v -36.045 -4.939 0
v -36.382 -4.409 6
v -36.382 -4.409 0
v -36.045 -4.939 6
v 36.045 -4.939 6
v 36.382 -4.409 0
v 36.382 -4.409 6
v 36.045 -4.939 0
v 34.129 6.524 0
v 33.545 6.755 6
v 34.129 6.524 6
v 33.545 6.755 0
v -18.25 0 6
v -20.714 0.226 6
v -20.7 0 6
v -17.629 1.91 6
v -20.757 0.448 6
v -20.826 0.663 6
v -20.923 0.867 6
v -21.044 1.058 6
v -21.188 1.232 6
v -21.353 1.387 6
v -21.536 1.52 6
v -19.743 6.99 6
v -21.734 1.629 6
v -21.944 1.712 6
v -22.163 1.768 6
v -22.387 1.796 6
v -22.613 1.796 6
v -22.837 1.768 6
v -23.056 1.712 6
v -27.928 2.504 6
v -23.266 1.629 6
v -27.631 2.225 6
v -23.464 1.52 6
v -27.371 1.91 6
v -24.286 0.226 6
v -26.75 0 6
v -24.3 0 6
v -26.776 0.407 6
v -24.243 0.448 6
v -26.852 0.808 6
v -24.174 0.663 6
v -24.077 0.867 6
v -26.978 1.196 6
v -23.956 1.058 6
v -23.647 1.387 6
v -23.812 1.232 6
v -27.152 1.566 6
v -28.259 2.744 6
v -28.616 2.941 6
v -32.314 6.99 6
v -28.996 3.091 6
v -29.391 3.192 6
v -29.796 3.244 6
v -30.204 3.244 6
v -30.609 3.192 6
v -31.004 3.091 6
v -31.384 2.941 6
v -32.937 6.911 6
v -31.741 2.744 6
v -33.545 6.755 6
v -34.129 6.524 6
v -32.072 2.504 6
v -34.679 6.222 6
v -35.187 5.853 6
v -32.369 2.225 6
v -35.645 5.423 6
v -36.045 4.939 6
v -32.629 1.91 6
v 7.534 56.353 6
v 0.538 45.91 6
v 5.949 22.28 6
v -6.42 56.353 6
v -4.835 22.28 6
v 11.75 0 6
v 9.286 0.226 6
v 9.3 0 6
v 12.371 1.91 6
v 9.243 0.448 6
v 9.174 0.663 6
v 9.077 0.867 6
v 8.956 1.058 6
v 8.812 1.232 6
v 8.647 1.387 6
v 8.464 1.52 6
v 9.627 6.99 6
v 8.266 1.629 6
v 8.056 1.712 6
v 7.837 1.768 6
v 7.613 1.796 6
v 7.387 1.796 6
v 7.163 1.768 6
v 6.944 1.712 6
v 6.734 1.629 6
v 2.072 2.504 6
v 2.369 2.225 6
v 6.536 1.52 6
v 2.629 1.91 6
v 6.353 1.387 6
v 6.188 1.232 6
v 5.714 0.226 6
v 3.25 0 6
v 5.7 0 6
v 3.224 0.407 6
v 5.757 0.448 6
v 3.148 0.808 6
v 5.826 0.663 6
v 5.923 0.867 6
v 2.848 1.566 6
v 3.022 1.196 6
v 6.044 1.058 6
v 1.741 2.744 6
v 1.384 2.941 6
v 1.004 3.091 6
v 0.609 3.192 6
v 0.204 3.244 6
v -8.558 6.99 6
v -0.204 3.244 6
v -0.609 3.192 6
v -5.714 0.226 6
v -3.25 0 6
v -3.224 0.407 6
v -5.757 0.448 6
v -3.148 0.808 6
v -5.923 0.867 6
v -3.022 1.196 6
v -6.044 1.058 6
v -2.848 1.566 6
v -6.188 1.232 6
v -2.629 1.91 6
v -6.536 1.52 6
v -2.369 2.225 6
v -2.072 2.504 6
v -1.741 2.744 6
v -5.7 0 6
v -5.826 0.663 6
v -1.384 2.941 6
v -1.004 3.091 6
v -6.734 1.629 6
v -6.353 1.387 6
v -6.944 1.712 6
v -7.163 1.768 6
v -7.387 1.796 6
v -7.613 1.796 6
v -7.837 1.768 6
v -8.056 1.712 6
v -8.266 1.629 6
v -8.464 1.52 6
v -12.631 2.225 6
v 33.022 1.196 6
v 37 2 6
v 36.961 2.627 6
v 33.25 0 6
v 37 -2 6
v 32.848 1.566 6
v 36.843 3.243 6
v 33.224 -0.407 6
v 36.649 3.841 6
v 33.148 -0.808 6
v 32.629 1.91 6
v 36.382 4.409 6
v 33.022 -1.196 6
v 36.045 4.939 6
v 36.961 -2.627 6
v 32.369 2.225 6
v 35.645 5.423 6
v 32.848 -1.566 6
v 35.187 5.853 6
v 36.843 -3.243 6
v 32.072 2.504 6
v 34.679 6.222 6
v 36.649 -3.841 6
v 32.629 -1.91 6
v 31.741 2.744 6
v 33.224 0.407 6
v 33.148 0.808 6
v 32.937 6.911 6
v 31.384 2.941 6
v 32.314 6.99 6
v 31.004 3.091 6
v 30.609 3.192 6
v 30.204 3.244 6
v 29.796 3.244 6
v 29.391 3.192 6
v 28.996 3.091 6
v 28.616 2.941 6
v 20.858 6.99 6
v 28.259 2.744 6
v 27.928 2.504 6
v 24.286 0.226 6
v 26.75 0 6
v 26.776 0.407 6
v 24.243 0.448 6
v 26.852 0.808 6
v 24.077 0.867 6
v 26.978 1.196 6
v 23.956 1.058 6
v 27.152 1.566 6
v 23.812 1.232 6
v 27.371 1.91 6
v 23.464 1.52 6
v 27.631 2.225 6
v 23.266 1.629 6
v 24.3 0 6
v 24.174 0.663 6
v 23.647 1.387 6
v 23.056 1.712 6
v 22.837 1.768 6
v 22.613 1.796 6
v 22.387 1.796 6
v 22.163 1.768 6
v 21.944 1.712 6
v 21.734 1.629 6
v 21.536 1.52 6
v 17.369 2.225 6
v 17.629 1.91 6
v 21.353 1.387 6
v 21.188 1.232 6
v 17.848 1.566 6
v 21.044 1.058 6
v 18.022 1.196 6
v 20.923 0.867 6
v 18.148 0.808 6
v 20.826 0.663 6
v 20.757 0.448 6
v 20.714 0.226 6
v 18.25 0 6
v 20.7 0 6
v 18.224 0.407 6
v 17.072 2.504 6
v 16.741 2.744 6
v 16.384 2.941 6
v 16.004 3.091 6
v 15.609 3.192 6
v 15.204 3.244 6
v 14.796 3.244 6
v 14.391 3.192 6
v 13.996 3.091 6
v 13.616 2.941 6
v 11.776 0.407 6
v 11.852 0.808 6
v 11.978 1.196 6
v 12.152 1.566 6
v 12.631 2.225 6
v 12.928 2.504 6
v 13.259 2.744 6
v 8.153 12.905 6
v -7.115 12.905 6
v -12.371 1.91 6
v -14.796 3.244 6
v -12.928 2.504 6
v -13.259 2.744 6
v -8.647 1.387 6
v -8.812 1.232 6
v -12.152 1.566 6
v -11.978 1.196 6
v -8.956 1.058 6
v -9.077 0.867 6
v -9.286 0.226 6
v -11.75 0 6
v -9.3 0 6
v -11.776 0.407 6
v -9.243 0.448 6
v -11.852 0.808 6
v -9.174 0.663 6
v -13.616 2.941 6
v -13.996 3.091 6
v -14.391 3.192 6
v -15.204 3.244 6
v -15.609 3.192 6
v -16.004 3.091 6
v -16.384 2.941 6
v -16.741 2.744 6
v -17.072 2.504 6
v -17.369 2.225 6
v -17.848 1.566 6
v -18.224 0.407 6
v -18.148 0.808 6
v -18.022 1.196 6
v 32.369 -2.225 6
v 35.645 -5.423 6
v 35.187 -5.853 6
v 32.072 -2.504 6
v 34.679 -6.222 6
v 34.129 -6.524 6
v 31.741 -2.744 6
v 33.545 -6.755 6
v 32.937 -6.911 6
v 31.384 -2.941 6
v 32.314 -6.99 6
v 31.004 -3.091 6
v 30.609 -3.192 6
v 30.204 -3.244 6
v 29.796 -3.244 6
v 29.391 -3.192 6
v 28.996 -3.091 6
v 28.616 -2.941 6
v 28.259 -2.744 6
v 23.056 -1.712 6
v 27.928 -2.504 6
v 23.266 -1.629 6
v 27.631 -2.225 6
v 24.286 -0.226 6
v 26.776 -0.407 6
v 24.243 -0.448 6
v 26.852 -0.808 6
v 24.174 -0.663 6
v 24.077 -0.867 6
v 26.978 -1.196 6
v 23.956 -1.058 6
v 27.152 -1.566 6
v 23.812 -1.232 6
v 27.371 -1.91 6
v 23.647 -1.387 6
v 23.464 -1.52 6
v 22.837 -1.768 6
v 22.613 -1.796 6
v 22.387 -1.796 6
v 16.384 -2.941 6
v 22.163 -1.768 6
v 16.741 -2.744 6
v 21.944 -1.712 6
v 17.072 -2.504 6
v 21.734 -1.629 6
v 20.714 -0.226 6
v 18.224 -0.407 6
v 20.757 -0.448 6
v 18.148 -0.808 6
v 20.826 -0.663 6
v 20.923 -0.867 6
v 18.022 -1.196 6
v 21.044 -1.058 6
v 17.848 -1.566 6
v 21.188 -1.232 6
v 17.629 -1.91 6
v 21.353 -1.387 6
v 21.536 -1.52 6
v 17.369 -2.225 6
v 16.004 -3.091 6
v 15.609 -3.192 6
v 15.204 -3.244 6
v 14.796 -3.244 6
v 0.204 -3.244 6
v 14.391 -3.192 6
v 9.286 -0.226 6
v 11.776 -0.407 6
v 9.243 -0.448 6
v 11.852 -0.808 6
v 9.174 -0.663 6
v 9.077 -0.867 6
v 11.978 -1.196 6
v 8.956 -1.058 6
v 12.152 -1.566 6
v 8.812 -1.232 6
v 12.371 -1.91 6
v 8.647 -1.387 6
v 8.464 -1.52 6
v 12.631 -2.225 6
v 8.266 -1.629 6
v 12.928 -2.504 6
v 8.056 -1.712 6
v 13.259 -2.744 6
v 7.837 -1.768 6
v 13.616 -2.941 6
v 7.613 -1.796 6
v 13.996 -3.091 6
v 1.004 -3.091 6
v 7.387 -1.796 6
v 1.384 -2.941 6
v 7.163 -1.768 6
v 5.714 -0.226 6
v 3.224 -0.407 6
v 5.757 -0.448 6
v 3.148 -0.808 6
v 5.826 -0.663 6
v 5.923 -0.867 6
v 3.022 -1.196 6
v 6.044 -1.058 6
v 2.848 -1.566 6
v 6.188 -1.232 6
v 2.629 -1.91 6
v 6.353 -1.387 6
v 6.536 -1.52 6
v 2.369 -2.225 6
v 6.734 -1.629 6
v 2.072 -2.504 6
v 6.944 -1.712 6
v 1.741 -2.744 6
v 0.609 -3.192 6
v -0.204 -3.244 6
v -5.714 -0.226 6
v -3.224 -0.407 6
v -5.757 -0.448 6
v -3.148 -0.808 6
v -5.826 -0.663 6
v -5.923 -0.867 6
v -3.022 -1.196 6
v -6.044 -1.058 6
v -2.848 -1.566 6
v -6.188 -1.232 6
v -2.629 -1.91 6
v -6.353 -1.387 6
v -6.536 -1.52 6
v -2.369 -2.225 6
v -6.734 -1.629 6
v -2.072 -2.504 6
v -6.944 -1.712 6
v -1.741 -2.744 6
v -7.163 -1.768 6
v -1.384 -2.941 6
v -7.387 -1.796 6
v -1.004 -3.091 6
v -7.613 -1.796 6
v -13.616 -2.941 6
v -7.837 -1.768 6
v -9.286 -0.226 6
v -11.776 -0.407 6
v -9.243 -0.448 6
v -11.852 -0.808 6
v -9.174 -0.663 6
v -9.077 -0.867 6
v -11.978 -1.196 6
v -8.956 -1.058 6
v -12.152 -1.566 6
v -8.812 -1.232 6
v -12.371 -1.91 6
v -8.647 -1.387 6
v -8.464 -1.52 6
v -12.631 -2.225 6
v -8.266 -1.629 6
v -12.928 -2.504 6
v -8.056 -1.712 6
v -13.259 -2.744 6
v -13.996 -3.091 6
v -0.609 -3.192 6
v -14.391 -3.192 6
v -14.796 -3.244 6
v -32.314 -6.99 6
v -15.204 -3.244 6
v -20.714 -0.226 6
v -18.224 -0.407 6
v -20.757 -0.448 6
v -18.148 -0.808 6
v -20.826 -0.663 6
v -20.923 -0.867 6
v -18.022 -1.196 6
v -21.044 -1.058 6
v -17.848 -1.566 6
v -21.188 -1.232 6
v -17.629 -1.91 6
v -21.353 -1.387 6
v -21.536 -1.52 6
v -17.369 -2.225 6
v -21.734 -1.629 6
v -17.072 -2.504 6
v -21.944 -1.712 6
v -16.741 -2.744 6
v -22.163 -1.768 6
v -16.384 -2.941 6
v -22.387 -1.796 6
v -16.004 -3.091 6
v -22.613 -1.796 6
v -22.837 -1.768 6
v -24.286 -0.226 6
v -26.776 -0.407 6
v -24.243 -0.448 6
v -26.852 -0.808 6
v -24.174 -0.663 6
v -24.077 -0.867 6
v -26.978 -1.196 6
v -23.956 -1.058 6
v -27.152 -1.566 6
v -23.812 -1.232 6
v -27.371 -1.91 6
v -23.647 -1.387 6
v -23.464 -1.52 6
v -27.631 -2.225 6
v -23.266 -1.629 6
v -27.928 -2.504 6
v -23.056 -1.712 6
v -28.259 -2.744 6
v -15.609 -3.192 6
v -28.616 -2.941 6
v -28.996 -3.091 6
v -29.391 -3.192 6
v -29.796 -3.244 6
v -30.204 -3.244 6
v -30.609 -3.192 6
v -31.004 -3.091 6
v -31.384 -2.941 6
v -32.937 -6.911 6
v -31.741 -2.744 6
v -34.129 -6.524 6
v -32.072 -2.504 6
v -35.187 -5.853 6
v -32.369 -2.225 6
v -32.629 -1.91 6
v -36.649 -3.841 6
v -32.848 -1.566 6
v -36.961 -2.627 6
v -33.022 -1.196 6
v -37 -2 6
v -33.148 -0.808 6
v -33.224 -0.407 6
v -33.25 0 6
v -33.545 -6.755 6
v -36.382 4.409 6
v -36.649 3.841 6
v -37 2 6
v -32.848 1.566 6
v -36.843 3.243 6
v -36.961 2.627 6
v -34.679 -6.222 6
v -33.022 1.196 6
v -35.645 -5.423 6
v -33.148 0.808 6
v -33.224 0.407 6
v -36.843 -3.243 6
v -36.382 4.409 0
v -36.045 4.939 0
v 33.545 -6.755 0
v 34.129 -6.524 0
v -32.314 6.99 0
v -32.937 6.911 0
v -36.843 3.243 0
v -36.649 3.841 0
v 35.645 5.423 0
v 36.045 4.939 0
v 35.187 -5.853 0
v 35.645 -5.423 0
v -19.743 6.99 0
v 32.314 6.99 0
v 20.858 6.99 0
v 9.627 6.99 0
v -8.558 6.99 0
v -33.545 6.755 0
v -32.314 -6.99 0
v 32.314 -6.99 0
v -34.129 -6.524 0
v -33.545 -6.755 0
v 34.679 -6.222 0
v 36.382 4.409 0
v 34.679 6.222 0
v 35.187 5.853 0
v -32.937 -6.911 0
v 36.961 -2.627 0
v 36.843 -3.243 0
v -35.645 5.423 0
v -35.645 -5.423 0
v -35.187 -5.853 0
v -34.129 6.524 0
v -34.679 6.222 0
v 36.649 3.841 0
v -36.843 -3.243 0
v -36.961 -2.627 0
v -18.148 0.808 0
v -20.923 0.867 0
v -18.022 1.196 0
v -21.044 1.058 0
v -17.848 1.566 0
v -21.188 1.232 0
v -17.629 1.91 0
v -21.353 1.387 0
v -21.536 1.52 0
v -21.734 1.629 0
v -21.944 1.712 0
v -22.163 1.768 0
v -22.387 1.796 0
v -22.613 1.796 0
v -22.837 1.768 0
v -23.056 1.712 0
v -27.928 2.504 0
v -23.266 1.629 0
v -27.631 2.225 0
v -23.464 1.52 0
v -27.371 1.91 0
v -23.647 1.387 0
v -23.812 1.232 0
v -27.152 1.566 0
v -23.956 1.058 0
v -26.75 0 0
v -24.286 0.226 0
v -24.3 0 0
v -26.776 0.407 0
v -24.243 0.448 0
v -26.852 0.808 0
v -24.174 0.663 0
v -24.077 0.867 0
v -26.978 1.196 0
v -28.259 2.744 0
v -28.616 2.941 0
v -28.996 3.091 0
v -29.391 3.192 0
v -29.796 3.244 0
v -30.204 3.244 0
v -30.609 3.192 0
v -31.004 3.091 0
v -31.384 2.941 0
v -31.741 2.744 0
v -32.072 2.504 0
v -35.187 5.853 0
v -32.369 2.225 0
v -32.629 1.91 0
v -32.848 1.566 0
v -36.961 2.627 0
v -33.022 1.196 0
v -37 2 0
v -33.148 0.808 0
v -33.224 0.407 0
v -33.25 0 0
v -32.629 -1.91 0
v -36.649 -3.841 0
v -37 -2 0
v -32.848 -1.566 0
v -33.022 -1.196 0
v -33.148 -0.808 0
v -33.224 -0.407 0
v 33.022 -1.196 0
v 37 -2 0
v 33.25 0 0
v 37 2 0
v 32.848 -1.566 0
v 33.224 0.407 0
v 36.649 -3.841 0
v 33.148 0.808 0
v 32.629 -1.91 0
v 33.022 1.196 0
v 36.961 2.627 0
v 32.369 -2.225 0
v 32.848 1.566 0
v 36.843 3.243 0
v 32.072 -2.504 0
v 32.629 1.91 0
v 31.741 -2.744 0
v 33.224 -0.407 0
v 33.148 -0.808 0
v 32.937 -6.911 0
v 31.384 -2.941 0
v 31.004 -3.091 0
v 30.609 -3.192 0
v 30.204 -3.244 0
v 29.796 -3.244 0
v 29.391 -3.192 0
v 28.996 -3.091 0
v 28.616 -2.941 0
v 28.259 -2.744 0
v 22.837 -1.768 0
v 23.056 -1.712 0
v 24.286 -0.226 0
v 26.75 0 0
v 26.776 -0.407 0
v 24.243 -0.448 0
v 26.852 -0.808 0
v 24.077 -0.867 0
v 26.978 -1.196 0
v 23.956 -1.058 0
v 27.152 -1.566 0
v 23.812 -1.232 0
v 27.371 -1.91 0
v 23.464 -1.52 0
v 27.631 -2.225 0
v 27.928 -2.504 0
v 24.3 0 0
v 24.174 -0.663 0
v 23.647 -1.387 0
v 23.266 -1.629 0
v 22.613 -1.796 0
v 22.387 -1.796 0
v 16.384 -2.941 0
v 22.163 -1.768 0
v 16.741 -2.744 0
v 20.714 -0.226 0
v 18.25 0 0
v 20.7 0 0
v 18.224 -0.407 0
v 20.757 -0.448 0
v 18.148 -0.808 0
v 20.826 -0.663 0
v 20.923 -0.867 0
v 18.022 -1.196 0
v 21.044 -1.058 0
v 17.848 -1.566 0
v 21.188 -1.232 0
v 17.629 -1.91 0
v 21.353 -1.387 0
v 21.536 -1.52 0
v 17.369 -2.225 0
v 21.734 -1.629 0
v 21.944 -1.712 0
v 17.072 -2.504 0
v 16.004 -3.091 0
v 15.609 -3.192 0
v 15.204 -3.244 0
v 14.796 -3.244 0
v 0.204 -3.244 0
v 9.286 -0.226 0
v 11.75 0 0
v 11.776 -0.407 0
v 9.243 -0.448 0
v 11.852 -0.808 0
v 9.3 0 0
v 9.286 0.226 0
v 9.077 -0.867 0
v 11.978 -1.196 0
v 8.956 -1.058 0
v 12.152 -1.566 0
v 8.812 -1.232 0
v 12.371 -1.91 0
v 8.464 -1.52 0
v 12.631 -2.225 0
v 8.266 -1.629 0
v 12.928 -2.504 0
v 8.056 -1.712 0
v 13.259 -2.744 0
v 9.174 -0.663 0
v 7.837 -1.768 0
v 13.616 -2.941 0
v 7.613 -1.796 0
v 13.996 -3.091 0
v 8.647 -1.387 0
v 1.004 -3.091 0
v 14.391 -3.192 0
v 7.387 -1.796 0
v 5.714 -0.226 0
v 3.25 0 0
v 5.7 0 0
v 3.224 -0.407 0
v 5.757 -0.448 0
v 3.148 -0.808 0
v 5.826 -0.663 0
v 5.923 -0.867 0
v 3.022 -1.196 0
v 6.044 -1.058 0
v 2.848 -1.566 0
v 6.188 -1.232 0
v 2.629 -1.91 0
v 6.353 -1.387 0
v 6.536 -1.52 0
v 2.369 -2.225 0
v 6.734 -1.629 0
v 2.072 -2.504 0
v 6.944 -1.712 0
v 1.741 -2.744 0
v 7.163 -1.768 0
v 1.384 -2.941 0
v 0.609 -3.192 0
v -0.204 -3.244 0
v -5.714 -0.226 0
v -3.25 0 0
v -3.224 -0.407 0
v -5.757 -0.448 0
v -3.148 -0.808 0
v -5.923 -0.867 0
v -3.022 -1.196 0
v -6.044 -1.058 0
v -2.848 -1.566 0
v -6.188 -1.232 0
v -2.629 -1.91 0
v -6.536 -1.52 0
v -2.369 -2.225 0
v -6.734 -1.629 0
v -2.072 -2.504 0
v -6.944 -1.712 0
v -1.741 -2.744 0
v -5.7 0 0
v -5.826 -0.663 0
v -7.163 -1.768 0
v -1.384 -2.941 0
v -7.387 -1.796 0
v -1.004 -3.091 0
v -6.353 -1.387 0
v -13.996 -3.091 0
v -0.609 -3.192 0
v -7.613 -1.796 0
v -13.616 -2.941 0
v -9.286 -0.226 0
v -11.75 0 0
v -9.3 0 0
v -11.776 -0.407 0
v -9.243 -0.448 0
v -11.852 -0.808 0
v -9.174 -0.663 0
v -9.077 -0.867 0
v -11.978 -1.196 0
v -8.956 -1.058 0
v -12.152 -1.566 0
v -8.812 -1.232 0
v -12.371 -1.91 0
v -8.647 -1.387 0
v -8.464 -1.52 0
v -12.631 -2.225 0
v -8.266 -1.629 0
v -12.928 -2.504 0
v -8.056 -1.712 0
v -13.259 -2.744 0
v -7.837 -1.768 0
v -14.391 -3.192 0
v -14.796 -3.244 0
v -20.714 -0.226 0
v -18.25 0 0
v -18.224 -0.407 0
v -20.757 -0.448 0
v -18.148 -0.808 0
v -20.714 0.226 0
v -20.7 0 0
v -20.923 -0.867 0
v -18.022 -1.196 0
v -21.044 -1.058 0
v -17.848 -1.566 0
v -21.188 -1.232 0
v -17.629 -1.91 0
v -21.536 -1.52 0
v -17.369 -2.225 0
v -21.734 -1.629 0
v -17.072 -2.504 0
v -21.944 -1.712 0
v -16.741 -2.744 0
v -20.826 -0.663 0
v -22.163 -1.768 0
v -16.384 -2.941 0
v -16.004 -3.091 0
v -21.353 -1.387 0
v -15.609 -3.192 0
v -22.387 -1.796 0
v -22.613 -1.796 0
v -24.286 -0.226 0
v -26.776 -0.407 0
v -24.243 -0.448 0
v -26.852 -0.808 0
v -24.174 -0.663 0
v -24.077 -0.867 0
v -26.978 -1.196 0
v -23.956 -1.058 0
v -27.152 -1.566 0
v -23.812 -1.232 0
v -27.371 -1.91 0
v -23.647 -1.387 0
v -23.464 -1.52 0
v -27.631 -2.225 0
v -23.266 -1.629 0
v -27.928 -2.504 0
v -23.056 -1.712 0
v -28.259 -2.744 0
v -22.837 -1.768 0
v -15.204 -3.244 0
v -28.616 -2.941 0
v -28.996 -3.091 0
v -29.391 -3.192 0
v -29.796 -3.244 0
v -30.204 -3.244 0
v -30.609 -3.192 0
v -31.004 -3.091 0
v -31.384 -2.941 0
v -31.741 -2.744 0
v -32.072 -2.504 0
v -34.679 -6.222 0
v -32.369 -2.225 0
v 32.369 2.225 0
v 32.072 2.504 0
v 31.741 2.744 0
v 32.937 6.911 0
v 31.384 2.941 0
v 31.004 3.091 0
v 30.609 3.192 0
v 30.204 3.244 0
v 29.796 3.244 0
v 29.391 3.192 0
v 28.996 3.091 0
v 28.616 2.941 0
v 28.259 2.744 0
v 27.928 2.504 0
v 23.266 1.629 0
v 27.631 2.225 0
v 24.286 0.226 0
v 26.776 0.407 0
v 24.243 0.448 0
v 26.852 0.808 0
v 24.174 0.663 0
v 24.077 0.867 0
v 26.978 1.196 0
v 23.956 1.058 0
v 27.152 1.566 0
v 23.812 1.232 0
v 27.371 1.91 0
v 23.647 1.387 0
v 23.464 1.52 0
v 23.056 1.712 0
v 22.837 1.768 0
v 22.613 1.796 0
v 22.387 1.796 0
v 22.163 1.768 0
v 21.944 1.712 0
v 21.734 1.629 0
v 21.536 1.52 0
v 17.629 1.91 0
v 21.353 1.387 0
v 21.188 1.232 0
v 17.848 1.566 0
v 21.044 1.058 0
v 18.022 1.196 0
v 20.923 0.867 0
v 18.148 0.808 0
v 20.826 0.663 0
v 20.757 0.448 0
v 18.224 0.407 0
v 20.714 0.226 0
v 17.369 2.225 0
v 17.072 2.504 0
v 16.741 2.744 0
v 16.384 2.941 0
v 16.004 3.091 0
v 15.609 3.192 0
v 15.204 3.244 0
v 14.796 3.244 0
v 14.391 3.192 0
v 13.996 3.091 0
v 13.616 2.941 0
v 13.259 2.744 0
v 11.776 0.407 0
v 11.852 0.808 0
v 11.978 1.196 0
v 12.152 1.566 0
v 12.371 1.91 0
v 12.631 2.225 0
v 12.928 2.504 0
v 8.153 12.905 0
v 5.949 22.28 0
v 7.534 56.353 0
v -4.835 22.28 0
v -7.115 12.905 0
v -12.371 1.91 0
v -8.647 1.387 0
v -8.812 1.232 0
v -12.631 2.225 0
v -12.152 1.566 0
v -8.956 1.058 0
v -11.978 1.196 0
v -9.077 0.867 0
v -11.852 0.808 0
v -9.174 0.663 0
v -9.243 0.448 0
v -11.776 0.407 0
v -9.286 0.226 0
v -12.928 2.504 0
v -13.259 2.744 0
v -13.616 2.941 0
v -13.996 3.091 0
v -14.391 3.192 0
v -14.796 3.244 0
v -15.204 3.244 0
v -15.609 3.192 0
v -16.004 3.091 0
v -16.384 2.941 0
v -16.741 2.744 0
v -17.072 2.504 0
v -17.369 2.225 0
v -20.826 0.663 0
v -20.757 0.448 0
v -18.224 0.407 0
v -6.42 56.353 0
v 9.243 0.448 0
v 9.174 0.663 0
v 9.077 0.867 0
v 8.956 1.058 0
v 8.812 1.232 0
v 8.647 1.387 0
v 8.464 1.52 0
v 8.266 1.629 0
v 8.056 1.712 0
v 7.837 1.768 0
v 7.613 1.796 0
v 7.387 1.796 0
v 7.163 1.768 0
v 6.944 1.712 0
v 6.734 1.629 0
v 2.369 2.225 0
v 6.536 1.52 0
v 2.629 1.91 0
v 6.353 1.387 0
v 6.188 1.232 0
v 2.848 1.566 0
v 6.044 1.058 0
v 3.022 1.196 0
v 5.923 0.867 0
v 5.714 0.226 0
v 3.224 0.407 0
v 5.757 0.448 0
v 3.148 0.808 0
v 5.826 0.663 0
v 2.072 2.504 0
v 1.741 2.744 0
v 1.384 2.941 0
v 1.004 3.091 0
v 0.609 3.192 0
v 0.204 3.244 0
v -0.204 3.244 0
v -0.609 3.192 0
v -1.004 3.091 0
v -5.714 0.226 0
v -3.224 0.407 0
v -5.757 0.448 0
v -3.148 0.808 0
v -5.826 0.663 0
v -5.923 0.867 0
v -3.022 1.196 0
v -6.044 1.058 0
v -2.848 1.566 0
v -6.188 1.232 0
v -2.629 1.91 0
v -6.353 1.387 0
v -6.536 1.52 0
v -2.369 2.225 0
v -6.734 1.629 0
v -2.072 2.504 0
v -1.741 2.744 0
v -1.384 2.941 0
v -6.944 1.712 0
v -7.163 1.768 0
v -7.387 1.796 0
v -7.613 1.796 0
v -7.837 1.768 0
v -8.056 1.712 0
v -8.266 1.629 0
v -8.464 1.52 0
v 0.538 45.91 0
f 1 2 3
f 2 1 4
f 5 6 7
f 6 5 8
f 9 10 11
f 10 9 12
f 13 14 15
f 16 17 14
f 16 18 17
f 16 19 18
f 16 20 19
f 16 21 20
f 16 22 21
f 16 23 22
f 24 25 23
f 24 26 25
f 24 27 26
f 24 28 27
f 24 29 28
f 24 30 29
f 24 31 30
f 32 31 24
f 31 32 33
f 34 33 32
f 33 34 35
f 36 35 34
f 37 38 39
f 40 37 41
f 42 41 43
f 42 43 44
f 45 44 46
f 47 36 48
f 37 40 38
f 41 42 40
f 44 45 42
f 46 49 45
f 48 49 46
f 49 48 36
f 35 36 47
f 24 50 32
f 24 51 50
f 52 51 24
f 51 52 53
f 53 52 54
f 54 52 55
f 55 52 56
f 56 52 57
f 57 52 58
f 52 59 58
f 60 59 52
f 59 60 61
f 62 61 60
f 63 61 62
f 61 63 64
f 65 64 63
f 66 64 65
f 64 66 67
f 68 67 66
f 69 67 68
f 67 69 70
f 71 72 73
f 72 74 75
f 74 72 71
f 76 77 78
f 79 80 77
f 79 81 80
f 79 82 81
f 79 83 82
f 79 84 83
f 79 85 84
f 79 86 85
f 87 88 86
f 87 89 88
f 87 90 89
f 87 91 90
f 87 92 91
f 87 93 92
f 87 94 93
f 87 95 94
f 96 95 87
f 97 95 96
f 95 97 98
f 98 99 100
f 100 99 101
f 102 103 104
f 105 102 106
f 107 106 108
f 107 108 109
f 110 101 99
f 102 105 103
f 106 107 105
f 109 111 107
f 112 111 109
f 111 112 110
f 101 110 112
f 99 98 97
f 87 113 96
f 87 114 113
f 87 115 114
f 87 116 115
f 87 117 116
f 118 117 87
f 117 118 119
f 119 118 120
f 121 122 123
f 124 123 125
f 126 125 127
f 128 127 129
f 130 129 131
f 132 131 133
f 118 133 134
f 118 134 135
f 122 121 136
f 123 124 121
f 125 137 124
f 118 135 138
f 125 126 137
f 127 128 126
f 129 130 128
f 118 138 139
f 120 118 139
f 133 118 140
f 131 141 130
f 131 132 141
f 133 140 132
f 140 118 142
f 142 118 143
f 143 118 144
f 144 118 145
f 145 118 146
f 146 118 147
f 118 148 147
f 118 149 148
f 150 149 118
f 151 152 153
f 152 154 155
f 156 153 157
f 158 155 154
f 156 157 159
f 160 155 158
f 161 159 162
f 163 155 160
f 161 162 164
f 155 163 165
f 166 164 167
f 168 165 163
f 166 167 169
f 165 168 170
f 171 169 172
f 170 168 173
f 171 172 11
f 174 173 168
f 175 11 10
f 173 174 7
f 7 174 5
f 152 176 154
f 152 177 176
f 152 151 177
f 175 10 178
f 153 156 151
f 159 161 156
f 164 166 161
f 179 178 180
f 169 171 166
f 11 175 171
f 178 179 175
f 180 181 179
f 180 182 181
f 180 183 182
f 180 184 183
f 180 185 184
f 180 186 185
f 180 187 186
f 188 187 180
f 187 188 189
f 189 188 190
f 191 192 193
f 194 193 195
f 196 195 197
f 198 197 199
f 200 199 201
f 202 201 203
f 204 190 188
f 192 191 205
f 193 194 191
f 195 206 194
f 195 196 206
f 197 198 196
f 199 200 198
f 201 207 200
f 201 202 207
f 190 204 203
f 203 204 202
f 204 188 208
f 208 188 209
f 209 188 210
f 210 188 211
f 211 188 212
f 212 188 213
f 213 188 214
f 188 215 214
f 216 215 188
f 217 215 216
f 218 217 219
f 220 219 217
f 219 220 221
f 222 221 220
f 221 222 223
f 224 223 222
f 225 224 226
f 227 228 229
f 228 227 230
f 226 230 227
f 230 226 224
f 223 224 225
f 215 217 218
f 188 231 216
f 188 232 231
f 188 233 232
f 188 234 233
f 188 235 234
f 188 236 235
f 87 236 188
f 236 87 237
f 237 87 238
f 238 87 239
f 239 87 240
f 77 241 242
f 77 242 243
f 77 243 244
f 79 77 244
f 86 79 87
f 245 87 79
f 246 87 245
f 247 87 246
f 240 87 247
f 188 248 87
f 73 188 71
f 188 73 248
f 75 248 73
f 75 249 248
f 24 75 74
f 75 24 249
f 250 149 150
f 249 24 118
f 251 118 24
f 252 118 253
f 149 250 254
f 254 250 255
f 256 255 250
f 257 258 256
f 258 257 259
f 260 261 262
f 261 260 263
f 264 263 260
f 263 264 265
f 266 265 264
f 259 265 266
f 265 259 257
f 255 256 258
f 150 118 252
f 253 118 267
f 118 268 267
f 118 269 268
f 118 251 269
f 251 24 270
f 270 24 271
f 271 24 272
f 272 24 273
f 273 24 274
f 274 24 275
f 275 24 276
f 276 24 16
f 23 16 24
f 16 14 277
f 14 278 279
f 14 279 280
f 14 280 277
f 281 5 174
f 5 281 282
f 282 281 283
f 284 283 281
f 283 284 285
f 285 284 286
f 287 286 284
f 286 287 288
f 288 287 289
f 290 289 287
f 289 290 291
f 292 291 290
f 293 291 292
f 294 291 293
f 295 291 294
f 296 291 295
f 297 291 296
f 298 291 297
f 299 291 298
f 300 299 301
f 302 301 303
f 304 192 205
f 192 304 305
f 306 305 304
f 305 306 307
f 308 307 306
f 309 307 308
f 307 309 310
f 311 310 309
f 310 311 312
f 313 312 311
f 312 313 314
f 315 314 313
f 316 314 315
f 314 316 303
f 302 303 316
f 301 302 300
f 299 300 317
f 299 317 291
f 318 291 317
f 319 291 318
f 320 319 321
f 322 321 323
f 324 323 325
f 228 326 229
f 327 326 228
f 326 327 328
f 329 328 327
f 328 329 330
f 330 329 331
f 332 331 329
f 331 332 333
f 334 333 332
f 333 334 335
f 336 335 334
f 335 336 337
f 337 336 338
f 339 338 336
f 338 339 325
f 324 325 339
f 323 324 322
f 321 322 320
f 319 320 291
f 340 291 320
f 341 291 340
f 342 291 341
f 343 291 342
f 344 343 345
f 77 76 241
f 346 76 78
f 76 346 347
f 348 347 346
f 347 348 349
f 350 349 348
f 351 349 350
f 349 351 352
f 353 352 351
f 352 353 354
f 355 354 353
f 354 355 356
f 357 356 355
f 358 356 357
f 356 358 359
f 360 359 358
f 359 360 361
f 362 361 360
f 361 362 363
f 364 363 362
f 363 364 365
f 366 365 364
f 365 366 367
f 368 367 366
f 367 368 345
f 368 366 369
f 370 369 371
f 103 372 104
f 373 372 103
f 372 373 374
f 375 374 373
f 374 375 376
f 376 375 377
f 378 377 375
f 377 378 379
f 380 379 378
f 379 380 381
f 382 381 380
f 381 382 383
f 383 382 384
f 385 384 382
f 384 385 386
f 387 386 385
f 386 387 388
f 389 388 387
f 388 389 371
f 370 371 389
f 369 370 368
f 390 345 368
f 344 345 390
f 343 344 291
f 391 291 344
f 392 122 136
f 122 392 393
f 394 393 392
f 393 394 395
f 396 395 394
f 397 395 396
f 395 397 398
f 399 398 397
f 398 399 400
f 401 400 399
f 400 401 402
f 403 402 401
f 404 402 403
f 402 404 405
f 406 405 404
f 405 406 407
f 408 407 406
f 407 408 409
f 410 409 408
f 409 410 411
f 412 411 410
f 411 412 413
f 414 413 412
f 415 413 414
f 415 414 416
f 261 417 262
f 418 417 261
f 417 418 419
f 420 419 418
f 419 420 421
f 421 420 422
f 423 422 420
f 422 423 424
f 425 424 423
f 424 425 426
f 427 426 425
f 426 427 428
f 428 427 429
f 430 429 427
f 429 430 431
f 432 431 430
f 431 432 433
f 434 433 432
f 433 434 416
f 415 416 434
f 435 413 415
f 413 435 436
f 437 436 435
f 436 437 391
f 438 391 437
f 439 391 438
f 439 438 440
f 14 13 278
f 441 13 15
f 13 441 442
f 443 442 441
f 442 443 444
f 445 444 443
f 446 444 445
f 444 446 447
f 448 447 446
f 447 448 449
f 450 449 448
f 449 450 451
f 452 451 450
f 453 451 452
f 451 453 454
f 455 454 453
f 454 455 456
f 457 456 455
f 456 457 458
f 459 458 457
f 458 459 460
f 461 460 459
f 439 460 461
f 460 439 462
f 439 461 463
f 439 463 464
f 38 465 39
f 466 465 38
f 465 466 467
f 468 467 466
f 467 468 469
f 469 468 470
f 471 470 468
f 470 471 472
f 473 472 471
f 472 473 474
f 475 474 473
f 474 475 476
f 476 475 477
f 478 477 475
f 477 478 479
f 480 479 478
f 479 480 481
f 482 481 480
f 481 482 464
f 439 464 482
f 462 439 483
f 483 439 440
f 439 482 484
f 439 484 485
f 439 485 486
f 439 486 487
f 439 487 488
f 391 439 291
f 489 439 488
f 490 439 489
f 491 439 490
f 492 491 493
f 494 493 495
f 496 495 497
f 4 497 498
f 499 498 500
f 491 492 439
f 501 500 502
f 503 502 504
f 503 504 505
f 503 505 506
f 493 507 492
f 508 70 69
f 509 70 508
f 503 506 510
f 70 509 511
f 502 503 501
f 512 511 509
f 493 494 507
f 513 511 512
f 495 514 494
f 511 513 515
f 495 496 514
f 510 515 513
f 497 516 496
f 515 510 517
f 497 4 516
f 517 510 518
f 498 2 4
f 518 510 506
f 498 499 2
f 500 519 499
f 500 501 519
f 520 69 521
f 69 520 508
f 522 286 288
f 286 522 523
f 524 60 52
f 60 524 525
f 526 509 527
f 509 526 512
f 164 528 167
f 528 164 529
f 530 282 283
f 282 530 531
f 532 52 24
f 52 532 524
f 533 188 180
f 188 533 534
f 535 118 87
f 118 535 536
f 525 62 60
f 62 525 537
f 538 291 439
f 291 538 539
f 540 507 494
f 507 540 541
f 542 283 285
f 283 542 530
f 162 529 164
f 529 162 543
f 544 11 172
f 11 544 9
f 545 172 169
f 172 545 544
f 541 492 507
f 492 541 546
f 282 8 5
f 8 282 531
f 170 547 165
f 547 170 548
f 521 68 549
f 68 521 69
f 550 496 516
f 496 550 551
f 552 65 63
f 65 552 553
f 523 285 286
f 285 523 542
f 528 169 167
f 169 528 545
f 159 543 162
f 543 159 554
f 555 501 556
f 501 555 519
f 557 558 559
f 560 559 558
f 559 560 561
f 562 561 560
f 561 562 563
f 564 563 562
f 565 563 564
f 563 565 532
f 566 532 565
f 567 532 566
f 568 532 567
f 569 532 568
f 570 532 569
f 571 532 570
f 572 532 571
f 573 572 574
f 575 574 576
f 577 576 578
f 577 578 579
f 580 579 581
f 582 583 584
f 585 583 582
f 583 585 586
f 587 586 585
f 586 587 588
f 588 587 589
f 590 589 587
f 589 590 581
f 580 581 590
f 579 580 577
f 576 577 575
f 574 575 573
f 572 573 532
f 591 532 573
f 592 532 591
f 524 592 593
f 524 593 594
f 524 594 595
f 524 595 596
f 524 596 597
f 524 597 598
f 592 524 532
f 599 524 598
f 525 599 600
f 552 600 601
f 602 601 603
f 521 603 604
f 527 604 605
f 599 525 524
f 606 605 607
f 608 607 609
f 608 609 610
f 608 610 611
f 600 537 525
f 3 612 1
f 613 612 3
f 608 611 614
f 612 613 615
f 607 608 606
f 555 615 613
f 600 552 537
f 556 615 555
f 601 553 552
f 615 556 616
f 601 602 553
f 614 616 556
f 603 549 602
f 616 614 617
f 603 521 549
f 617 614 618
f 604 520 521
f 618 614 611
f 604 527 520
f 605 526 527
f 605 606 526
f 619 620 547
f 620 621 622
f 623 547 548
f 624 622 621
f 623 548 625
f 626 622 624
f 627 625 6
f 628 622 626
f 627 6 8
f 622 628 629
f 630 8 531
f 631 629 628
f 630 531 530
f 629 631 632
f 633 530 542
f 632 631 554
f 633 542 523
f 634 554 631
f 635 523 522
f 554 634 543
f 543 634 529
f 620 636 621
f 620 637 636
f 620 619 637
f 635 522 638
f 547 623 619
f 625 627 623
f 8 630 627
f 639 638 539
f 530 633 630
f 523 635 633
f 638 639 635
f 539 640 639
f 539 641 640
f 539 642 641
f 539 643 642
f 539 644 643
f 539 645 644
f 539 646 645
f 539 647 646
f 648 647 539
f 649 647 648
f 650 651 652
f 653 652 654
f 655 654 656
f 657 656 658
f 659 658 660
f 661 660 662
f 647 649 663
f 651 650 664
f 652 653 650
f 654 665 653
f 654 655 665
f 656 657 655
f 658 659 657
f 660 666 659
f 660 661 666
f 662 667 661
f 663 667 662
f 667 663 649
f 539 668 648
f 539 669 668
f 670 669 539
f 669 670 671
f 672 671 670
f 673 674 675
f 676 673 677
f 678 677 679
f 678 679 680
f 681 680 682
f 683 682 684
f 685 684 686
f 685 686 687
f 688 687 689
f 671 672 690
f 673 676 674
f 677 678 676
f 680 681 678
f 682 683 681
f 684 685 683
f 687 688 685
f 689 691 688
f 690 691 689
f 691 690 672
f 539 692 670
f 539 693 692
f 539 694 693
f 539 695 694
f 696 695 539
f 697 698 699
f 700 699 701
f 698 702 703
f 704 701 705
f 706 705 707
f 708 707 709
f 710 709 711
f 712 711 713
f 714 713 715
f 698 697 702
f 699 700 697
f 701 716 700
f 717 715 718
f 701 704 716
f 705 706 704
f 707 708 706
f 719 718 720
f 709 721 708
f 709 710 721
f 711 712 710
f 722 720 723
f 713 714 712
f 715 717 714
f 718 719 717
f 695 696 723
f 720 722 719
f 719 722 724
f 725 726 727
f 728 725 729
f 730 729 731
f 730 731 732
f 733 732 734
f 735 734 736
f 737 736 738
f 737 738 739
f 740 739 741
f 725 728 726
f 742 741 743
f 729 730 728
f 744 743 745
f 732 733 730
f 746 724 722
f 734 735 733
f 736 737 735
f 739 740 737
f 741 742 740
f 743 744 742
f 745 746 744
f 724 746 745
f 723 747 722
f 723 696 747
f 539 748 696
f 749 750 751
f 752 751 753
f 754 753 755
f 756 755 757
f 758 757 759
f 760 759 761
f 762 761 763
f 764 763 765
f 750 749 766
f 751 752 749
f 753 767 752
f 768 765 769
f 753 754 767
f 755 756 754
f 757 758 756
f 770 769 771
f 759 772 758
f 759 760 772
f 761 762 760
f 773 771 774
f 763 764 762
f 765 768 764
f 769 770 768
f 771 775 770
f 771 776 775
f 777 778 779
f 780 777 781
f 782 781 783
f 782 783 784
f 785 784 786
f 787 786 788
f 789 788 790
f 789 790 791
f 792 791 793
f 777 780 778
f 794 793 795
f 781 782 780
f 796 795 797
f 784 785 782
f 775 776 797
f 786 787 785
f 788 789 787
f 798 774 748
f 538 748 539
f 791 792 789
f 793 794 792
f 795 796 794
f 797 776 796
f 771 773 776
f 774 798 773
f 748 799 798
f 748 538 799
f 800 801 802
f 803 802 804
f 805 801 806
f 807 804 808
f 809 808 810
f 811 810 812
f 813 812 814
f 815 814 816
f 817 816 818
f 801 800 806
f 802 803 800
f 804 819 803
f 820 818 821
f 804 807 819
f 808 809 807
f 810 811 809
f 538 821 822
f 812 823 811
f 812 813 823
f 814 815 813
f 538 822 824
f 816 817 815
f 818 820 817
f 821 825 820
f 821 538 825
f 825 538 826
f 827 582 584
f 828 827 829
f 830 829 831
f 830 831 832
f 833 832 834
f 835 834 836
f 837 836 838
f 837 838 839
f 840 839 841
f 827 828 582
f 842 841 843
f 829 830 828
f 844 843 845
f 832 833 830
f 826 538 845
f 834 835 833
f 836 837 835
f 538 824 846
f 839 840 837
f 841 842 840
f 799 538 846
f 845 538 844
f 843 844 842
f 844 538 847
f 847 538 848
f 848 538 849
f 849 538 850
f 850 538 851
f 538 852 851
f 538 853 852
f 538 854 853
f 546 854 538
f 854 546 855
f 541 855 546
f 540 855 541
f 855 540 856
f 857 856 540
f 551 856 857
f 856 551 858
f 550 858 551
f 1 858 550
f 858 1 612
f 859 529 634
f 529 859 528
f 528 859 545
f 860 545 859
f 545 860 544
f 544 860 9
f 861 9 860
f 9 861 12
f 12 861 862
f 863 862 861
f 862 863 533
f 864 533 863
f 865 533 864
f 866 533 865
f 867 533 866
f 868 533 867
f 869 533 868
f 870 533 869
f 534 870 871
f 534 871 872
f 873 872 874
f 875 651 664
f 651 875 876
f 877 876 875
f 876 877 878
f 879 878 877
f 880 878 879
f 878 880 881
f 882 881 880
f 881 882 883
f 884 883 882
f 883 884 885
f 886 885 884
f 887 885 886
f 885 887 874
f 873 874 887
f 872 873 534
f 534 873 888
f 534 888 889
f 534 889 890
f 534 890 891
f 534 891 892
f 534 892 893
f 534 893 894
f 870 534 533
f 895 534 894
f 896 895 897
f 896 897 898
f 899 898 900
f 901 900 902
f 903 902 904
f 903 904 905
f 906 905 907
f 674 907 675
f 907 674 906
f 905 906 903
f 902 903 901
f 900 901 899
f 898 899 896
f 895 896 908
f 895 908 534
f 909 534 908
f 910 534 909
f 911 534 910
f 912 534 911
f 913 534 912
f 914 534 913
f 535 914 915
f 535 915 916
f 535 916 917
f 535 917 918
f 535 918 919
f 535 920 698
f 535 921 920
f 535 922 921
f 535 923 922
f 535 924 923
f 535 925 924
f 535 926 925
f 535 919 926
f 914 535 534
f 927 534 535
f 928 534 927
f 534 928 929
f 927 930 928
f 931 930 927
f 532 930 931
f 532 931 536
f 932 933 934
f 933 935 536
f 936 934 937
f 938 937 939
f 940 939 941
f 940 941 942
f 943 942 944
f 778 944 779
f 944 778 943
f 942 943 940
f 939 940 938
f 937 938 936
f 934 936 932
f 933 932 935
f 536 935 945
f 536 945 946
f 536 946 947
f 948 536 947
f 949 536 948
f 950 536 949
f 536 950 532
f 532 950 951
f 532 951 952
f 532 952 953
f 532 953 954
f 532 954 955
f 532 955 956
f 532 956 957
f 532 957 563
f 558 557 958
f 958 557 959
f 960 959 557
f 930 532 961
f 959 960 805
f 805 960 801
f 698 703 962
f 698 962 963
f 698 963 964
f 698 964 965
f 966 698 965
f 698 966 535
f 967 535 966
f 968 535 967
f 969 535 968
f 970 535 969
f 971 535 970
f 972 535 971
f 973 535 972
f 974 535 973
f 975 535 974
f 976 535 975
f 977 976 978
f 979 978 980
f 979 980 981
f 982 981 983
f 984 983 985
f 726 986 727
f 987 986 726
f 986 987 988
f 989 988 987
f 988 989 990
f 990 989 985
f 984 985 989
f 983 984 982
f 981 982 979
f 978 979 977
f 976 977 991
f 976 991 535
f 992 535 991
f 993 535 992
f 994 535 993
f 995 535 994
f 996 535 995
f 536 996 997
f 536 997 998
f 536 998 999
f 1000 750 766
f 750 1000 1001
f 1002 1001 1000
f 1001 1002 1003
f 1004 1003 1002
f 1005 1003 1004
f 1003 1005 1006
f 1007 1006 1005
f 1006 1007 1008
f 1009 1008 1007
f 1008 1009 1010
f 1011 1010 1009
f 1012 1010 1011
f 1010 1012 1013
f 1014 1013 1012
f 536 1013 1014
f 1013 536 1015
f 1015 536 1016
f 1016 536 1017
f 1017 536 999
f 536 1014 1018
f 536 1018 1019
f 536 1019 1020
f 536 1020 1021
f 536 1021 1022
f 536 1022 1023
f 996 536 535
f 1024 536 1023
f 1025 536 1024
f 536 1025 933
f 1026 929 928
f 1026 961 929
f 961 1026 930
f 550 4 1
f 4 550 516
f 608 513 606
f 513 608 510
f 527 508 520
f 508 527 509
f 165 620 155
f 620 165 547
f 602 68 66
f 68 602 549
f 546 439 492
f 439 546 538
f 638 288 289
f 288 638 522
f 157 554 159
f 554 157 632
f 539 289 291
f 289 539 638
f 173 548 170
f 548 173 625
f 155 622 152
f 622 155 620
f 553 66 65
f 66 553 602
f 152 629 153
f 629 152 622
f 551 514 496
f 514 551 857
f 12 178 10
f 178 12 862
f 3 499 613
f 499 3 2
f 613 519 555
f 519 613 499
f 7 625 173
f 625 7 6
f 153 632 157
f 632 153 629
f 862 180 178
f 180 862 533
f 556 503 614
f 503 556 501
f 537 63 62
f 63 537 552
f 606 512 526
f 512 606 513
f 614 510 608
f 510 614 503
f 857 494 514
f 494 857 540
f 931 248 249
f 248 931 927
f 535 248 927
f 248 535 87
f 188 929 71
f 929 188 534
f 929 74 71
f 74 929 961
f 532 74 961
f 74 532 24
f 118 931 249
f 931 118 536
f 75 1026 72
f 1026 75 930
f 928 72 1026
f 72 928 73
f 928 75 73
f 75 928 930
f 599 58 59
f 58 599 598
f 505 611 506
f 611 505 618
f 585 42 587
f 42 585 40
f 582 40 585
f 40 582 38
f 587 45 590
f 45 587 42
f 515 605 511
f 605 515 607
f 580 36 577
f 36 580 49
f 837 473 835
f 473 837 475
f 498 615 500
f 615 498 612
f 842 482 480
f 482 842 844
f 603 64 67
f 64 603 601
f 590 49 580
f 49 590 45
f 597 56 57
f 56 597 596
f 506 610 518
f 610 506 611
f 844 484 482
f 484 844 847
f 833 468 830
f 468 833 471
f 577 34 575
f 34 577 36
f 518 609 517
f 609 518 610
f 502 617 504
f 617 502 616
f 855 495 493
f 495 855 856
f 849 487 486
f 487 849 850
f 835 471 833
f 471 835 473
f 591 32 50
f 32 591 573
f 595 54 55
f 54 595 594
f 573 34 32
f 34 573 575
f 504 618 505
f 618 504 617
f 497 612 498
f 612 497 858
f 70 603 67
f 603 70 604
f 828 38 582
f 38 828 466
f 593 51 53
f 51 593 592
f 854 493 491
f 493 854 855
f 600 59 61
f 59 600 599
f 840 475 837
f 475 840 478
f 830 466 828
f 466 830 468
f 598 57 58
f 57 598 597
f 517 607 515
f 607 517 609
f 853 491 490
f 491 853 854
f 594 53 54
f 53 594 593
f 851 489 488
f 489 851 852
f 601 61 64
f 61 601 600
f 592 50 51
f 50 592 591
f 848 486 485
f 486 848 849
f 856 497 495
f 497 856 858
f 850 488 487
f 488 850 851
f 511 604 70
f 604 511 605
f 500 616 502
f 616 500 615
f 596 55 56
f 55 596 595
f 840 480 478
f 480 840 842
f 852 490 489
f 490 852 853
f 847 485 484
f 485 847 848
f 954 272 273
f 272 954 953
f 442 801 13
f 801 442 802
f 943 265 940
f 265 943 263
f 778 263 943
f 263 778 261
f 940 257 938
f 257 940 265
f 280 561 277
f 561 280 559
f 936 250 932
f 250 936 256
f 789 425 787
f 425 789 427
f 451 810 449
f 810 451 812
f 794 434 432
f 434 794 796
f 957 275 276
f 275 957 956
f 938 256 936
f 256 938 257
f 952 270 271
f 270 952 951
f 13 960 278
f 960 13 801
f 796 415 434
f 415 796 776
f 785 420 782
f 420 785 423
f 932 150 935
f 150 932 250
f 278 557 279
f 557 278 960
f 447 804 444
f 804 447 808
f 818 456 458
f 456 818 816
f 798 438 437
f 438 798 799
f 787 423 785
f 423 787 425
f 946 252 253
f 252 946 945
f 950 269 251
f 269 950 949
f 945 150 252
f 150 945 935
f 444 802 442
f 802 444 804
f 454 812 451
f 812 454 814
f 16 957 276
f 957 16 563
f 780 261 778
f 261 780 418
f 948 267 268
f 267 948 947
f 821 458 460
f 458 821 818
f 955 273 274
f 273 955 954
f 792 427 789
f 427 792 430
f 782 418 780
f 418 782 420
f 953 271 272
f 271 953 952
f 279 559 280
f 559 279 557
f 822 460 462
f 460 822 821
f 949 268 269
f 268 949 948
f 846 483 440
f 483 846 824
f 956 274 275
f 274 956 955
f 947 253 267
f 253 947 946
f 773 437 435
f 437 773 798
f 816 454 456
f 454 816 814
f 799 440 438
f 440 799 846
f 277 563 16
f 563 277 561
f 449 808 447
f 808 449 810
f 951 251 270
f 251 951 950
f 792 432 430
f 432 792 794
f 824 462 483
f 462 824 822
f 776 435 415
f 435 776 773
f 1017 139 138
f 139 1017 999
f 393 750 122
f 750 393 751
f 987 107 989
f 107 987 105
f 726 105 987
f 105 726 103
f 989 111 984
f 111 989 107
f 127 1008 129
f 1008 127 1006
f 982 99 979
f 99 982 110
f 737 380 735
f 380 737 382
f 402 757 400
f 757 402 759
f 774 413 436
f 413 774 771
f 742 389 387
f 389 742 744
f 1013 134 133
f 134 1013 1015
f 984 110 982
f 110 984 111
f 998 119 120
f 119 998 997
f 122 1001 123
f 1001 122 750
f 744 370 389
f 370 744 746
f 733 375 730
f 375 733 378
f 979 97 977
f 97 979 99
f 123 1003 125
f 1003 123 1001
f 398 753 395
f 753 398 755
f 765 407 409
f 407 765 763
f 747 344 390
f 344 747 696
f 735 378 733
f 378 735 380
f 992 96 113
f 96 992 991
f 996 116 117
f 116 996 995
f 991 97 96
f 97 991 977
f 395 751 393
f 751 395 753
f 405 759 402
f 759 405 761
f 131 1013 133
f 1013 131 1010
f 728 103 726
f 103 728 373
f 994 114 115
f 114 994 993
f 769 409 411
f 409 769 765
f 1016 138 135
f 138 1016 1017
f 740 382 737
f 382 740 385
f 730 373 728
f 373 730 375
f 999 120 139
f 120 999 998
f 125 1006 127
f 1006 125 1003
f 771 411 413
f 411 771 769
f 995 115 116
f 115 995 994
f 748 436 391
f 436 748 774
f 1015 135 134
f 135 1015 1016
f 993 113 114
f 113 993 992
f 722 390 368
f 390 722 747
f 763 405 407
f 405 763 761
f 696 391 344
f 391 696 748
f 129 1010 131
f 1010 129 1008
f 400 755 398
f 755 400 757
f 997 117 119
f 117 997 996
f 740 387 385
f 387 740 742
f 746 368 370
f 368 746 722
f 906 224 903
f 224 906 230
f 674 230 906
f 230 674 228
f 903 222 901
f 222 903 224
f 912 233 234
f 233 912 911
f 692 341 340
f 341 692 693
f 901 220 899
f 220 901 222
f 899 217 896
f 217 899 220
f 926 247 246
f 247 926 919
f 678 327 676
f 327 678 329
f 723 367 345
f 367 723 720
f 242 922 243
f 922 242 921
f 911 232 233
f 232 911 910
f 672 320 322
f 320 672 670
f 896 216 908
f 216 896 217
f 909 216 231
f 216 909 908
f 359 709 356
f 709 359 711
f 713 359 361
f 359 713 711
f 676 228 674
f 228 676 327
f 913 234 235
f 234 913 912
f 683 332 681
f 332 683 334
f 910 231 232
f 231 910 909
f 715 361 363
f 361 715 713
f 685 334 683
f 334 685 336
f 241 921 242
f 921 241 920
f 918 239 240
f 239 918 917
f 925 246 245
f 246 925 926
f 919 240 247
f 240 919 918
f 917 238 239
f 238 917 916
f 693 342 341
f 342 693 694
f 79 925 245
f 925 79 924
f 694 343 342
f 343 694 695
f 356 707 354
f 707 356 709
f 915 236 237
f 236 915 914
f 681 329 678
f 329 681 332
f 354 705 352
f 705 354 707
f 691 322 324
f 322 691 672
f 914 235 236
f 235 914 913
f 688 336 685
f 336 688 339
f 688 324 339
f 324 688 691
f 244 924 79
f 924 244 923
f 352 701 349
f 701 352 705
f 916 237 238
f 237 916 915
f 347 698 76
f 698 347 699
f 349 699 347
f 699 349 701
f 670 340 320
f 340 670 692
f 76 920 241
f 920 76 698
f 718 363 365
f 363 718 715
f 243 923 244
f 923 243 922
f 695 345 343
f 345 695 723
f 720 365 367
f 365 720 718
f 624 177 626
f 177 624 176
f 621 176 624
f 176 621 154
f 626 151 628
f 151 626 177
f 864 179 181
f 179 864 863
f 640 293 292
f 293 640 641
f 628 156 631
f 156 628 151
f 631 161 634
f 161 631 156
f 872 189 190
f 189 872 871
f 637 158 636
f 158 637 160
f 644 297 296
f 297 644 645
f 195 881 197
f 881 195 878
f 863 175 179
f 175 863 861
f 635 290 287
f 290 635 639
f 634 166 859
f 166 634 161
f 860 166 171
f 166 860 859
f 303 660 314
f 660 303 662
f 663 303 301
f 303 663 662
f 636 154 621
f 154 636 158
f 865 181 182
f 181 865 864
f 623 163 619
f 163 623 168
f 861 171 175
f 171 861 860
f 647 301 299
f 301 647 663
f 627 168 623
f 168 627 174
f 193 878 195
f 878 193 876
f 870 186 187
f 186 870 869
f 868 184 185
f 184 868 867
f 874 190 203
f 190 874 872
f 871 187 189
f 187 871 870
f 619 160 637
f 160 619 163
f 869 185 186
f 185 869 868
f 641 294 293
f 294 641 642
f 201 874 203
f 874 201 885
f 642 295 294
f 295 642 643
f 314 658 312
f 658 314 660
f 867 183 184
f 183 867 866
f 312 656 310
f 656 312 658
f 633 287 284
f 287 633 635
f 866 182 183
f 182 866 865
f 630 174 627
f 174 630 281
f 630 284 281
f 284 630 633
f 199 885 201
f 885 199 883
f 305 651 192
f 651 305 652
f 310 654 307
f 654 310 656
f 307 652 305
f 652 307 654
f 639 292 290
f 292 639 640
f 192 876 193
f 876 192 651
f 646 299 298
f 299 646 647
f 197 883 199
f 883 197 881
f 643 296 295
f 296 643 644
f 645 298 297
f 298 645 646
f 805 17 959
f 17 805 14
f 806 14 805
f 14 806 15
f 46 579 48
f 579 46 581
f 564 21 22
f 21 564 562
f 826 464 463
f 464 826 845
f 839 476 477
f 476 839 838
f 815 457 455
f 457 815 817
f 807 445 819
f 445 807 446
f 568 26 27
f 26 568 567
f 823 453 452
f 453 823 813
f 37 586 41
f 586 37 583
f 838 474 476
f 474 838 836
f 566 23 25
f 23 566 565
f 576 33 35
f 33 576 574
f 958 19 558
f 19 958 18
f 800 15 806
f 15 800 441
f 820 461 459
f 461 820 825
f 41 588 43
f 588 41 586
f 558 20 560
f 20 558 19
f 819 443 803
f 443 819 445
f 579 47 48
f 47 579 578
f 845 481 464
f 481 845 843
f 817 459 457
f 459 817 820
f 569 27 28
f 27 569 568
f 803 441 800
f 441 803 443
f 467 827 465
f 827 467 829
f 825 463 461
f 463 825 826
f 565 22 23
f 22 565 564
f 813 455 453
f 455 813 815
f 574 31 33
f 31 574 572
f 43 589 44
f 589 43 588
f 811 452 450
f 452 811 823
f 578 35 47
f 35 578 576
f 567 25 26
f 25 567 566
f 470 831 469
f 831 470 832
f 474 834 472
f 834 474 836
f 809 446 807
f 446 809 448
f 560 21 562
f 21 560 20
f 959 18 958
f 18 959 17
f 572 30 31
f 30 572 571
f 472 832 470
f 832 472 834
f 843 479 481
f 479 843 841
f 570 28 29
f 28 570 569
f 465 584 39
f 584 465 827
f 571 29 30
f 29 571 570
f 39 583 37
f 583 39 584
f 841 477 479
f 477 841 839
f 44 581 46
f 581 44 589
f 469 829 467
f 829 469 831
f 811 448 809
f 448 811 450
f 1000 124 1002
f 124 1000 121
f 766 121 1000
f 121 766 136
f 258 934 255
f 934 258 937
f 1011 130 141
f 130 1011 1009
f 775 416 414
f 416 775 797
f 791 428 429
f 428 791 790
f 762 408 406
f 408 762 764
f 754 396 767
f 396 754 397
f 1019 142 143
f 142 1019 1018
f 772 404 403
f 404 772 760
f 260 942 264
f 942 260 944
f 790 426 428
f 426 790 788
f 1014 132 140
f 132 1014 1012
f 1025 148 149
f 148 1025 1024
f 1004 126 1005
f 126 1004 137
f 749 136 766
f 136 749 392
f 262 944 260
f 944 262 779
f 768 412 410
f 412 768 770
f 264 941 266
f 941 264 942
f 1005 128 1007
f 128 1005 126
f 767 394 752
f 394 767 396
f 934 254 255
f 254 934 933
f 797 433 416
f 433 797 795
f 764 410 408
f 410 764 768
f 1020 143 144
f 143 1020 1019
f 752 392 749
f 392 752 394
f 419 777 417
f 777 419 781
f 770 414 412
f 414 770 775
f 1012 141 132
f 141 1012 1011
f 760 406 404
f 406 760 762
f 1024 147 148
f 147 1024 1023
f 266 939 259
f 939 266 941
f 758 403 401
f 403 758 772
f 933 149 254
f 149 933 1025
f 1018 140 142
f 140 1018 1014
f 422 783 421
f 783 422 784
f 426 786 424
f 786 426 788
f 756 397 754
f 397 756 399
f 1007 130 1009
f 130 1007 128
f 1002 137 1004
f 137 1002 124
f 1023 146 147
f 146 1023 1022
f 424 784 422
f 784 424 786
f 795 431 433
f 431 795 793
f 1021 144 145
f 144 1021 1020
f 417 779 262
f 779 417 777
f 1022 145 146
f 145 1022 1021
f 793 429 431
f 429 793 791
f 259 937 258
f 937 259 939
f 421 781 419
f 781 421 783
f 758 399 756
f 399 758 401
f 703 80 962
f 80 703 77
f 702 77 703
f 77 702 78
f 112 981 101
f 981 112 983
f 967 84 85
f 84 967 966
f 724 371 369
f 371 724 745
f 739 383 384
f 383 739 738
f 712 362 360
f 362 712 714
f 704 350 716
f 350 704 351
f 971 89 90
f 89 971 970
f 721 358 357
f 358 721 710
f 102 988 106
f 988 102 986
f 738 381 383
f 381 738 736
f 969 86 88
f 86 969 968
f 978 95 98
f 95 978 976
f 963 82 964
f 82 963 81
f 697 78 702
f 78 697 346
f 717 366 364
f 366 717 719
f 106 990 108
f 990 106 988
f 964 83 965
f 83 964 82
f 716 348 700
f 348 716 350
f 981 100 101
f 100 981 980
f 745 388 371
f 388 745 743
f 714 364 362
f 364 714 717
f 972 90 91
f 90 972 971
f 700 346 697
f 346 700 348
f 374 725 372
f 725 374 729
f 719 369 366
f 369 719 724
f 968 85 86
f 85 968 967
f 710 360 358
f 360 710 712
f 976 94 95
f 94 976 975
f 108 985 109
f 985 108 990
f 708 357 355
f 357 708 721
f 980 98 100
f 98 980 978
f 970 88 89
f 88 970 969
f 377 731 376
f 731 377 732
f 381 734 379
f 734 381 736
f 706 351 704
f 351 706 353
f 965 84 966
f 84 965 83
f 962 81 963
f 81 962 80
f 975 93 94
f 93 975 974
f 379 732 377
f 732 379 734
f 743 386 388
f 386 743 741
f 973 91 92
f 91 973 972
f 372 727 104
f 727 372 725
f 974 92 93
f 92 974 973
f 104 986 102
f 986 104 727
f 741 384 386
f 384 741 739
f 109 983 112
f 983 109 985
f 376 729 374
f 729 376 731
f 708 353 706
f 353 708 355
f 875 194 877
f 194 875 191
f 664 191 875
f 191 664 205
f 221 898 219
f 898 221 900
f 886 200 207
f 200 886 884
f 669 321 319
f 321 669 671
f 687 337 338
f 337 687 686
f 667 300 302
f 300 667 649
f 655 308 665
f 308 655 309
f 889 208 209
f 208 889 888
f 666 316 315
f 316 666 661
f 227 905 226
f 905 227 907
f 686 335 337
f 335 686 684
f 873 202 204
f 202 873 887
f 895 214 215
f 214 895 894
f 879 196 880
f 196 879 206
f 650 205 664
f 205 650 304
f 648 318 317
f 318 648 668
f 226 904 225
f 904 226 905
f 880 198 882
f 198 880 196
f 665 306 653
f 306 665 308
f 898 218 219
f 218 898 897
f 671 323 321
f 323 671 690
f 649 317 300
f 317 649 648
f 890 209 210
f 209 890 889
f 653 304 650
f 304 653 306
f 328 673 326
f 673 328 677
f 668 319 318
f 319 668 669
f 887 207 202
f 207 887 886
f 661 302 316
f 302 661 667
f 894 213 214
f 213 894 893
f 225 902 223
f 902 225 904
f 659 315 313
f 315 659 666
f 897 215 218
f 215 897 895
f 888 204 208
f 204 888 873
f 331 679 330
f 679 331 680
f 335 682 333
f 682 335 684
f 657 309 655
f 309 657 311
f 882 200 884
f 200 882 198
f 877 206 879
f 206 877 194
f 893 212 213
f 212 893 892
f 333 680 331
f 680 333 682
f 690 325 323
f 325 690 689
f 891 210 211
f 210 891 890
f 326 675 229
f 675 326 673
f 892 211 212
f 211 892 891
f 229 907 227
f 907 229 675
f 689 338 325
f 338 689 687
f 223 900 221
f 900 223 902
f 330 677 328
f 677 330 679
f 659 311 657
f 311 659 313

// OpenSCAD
$fn = 50;


difference() {
	union() {
		hull() {
			translate(v = [-32.0000000000, 2.0000000000, 0]) {
				cylinder(h = 6, r = 5);
			}
			translate(v = [32.0000000000, 2.0000000000, 0]) {
				cylinder(h = 6, r = 5);
			}
			translate(v = [-32.0000000000, -2.0000000000, 0]) {
				cylinder(h = 6, r = 5);
			}
			translate(v = [32.0000000000, -2.0000000000, 0]) {
				cylinder(h = 6, r = 5);
			}
		}
		translate(v = [0, 55, 0]) {
			linear_extrude(height = 6) {
				text(font = "DejaVu Sans Mono:style=Bold", halign = "center", size = 57.0000000000, text = "A", valign = "top");
			}
		}
	}
	union() {
		translate(v = [-30.0000000000, 0.0000000000, 0]) {
			translate(v = [0, 0, -100]) {
				cylinder(h = 200, r = 3.2500000000);
			}
		}
		translate(v = [-15.0000000000, 0.0000000000, 0]) {
			translate(v = [0, 0, -100]) {
				cylinder(h = 200, r = 3.2500000000);
			}
		}
		translate(v = [0, 0, -100]) {
			cylinder(h = 200, r = 3.2500000000);
		}
		translate(v = [15.0000000000, 0.0000000000, 0]) {
			translate(v = [0, 0, -100]) {
				cylinder(h = 200, r = 3.2500000000);
			}
		}
		translate(v = [30.0000000000, 0.0000000000, 0]) {
			translate(v = [0, 0, -100]) {
				cylinder(h = 200, r = 3.2500000000);
			}
		}
		translate(v = [-30.0000000000, 0.0000000000, 0]) {
			translate(v = [0, 0, -100]) {
				cylinder(h = 200, r = 1.8000000000);
			}
		}
		translate(v = [-22.5000000000, 0.0000000000, 0]) {
			translate(v = [0, 0, -100]) {
				cylinder(h = 200, r = 1.8000000000);
			}
		}
		translate(v = [-15.0000000000, 0.0000000000, 0]) {
			translate(v = [0, 0, -100]) {
				cylinder(h = 200, r = 1.8000000000);
			}
		}
		translate(v = [-7.5000000000, 0.0000000000, 0]) {
			translate(v = [0, 0, -100]) {
				cylinder(h = 200, r = 1.8000000000);
			}
		}
		translate(v = [0, 0, -100]) {
			cylinder(h = 200, r = 1.8000000000);
		}
		translate(v = [7.5000000000, 0.0000000000, 0]) {
			translate(v = [0, 0, -100]) {
				cylinder(h = 200, r = 1.8000000000);
			}
		}
		translate(v = [15.0000000000, 0.0000000000, 0]) {
			translate(v = [0, 0, -100]) {
				cylinder(h = 200, r = 1.8000000000);
			}
		}
		translate(v = [22.5000000000, 0.0000000000, 0]) {
			translate(v = [0, 0, -100]) {
				cylinder(h = 200, r = 1.8000000000);
			}
		}
		translate(v = [30.0000000000, 0.0000000000, 0]) {
			translate(v = [0, 0, -100]) {
				cylinder(h = 200, r = 1.8000000000);
			}
		}
	}
}
